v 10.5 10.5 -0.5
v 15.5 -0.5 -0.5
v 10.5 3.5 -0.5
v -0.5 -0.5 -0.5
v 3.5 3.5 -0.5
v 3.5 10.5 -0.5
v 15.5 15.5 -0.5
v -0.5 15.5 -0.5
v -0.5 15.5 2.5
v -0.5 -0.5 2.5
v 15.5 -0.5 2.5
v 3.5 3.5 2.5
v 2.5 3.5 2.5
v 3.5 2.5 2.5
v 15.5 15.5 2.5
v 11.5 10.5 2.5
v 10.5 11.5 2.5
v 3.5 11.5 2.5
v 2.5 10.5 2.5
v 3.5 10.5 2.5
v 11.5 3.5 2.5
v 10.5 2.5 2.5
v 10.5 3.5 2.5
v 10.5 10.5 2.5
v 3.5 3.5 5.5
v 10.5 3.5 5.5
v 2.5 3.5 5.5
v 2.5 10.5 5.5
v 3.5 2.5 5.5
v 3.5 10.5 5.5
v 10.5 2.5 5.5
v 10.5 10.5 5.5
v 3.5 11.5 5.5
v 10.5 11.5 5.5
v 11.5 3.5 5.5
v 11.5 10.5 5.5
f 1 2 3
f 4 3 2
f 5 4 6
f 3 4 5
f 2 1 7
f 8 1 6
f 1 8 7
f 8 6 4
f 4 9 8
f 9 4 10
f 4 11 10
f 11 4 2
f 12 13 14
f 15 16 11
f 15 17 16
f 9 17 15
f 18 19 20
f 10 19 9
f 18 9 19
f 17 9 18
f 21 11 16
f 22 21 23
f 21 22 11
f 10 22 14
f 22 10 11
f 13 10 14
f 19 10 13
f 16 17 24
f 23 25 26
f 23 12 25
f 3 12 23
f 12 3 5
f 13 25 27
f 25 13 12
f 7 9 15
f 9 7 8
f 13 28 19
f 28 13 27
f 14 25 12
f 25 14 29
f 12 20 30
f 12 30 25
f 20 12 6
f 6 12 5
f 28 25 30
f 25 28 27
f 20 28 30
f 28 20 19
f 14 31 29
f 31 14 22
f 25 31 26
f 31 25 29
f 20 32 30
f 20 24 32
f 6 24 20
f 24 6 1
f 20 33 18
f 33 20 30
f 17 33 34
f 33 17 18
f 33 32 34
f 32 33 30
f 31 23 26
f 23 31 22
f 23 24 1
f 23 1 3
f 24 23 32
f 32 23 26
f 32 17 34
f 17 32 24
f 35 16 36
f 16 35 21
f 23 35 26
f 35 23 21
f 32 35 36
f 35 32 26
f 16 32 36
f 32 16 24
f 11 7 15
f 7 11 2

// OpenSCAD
union() {
    translate([0, 0, 0]) color("brown") cube([1, 1, 1],center=true);
    translate([0, 0, 1]) color("brown") cube([1, 1, 1],center=true);
    translate([0, 0, 2]) color("brown") cube([1, 1, 1],center=true);
    translate([0, 1, 0]) color("brown") cube([1, 1, 1],center=true);
    translate([0, 1, 1]) color("brown") cube([1, 1, 1],center=true);
    translate([0, 1, 2]) color("brown") cube([1, 1, 1],center=true);
    translate([0, 2, 0]) color("brown") cube([1, 1, 1],center=true);
    translate([0, 2, 1]) color("brown") cube([1, 1, 1],center=true);
    translate([0, 2, 2]) color("brown") cube([1, 1, 1],center=true);
    translate([0, 3, 0]) color("brown") cube([1, 1, 1],center=true);
    translate([0, 3, 1]) color("brown") cube([1, 1, 1],center=true);
    translate([0, 3, 2]) color("brown") cube([1, 1, 1],center=true);
    translate([0, 4, 0]) color("brown") cube([1, 1, 1],center=true);
    translate([0, 4, 1]) color("brown") cube([1, 1, 1],center=true);
    translate([0, 4, 2]) color("brown") cube([1, 1, 1],center=true);
    translate([0, 5, 0]) color("brown") cube([1, 1, 1],center=true);
    translate([0, 5, 1]) color("brown") cube([1, 1, 1],center=true);
    translate([0, 5, 2]) color("brown") cube([1, 1, 1],center=true);
    translate([0, 6, 0]) color("brown") cube([1, 1, 1],center=true);
    translate([0, 6, 1]) color("brown") cube([1, 1, 1],center=true);
    translate([0, 6, 2]) color("brown") cube([1, 1, 1],center=true);
    translate([0, 7, 0]) color("brown") cube([1, 1, 1],center=true);
    translate([0, 7, 1]) color("brown") cube([1, 1, 1],center=true);
    translate([0, 7, 2]) color("brown") cube([1, 1, 1],center=true);
    translate([0, 8, 0]) color("brown") cube([1, 1, 1],center=true);
    translate([0, 8, 1]) color("brown") cube([1, 1, 1],center=true);
    translate([0, 8, 2]) color("brown") cube([1, 1, 1],center=true);
    translate([0, 9, 0]) color("brown") cube([1, 1, 1],center=true);
    translate([0, 9, 1]) color("brown") cube([1, 1, 1],center=true);
    translate([0, 9, 2]) color("brown") cube([1, 1, 1],center=true);
    translate([0, 10, 0]) color("brown") cube([1, 1, 1],center=true);
    translate([0, 10, 1]) color("brown") cube([1, 1, 1],center=true);
    translate([0, 10, 2]) color("brown") cube([1, 1, 1],center=true);
    translate([0, 11, 0]) color("brown") cube([1, 1, 1],center=true);
    translate([0, 11, 1]) color("brown") cube([1, 1, 1],center=true);
    translate([0, 11, 2]) color("brown") cube([1, 1, 1],center=true);
    translate([0, 12, 0]) color("brown") cube([1, 1, 1],center=true);
    translate([0, 12, 1]) color("brown") cube([1, 1, 1],center=true);
    translate([0, 12, 2]) color("brown") cube([1, 1, 1],center=true);
    translate([0, 13, 0]) color("brown") cube([1, 1, 1],center=true);
    translate([0, 13, 1]) color("brown") cube([1, 1, 1],center=true);
    translate([0, 13, 2]) color("brown") cube([1, 1, 1],center=true);
    translate([0, 14, 0]) color("brown") cube([1, 1, 1],center=true);
    translate([0, 14, 1]) color("brown") cube([1, 1, 1],center=true);
    translate([0, 14, 2]) color("brown") cube([1, 1, 1],center=true);
    translate([0, 15, 0]) color("brown") cube([1, 1, 1],center=true);
    translate([0, 15, 1]) color("brown") cube([1, 1, 1],center=true);
    translate([0, 15, 2]) color("brown") cube([1, 1, 1],center=true);
    translate([1, 0, 0]) color("brown") cube([1, 1, 1],center=true);
    translate([1, 0, 1]) color("brown") cube([1, 1, 1],center=true);
    translate([1, 0, 2]) color("brown") cube([1, 1, 1],center=true);
    translate([1, 1, 0]) color("brown") cube([1, 1, 1],center=true);
    translate([1, 1, 1]) color("brown") cube([1, 1, 1],center=true);
    translate([1, 1, 2]) color("brown") cube([1, 1, 1],center=true);
    translate([1, 2, 0]) color("brown") cube([1, 1, 1],center=true);
    translate([1, 2, 1]) color("brown") cube([1, 1, 1],center=true);
    translate([1, 2, 2]) color("brown") cube([1, 1, 1],center=true);
    translate([1, 3, 0]) color("brown") cube([1, 1, 1],center=true);
    translate([1, 3, 1]) color("brown") cube([1, 1, 1],center=true);
    translate([1, 3, 2]) color("brown") cube([1, 1, 1],center=true);
    translate([1, 4, 0]) color("brown") cube([1, 1, 1],center=true);
    translate([1, 4, 1]) color("brown") cube([1, 1, 1],center=true);
    translate([1, 4, 2]) color("brown") cube([1, 1, 1],center=true);
    translate([1, 5, 0]) color("brown") cube([1, 1, 1],center=true);
    translate([1, 5, 1]) color("brown") cube([1, 1, 1],center=true);
    translate([1, 5, 2]) color("brown") cube([1, 1, 1],center=true);
    translate([1, 6, 0]) color("brown") cube([1, 1, 1],center=true);
    translate([1, 6, 1]) color("brown") cube([1, 1, 1],center=true);
    translate([1, 6, 2]) color("brown") cube([1, 1, 1],center=true);
    translate([1, 7, 0]) color("brown") cube([1, 1, 1],center=true);
    translate([1, 7, 1]) color("brown") cube([1, 1, 1],center=true);
    translate([1, 7, 2]) color("brown") cube([1, 1, 1],center=true);
    translate([1, 8, 0]) color("brown") cube([1, 1, 1],center=true);
    translate([1, 8, 1]) color("brown") cube([1, 1, 1],center=true);
    translate([1, 8, 2]) color("brown") cube([1, 1, 1],center=true);
    translate([1, 9, 0]) color("brown") cube([1, 1, 1],center=true);
    translate([1, 9, 1]) color("brown") cube([1, 1, 1],center=true);
    translate([1, 9, 2]) color("brown") cube([1, 1, 1],center=true);
    translate([1, 10, 0]) color("brown") cube([1, 1, 1],center=true);
    translate([1, 10, 1]) color("brown") cube([1, 1, 1],center=true);
    translate([1, 10, 2]) color("brown") cube([1, 1, 1],center=true);
    translate([1, 11, 0]) color("brown") cube([1, 1, 1],center=true);
    translate([1, 11, 1]) color("brown") cube([1, 1, 1],center=true);
    translate([1, 11, 2]) color("brown") cube([1, 1, 1],center=true);
    translate([1, 12, 0]) color("brown") cube([1, 1, 1],center=true);
    translate([1, 12, 1]) color("brown") cube([1, 1, 1],center=true);
    translate([1, 12, 2]) color("brown") cube([1, 1, 1],center=true);
    translate([1, 13, 0]) color("brown") cube([1, 1, 1],center=true);
    translate([1, 13, 1]) color("brown") cube([1, 1, 1],center=true);
    translate([1, 13, 2]) color("brown") cube([1, 1, 1],center=true);
    translate([1, 14, 0]) color("brown") cube([1, 1, 1],center=true);
    translate([1, 14, 1]) color("brown") cube([1, 1, 1],center=true);
    translate([1, 14, 2]) color("brown") cube([1, 1, 1],center=true);
    translate([1, 15, 0]) color("brown") cube([1, 1, 1],center=true);
    translate([1, 15, 1]) color("brown") cube([1, 1, 1],center=true);
    translate([1, 15, 2]) color("brown") cube([1, 1, 1],center=true);
    translate([2, 0, 0]) color("brown") cube([1, 1, 1],center=true);
    translate([2, 0, 1]) color("brown") cube([1, 1, 1],center=true);
    translate([2, 0, 2]) color("brown") cube([1, 1, 1],center=true);
    translate([2, 1, 0]) color("brown") cube([1, 1, 1],center=true);
    translate([2, 1, 1]) color("brown") cube([1, 1, 1],center=true);
    translate([2, 1, 2]) color("brown") cube([1, 1, 1],center=true);
    translate([2, 2, 0]) color("brown") cube([1, 1, 1],center=true);
    translate([2, 2, 1]) color("brown") cube([1, 1, 1],center=true);
    translate([2, 2, 2]) color("brown") cube([1, 1, 1],center=true);
    translate([2, 3, 0]) color("brown") cube([1, 1, 1],center=true);
    translate([2, 3, 1]) color("brown") cube([1, 1, 1],center=true);
    translate([2, 3, 2]) color("brown") cube([1, 1, 1],center=true);
    translate([2, 4, 0]) color("brown") cube([1, 1, 1],center=true);
    translate([2, 4, 1]) color("brown") cube([1, 1, 1],center=true);
    translate([2, 4, 2]) color("brown") cube([1, 1, 1],center=true);
    translate([2, 5, 0]) color("brown") cube([1, 1, 1],center=true);
    translate([2, 5, 1]) color("brown") cube([1, 1, 1],center=true);
    translate([2, 5, 2]) color("brown") cube([1, 1, 1],center=true);
    translate([2, 6, 0]) color("brown") cube([1, 1, 1],center=true);
    translate([2, 6, 1]) color("brown") cube([1, 1, 1],center=true);
    translate([2, 6, 2]) color("brown") cube([1, 1, 1],center=true);
    translate([2, 7, 0]) color("brown") cube([1, 1, 1],center=true);
    translate([2, 7, 1]) color("brown") cube([1, 1, 1],center=true);
    translate([2, 7, 2]) color("brown") cube([1, 1, 1],center=true);
    translate([2, 8, 0]) color("brown") cube([1, 1, 1],center=true);
    translate([2, 8, 1]) color("brown") cube([1, 1, 1],center=true);
    translate([2, 8, 2]) color("brown") cube([1, 1, 1],center=true);
    translate([2, 9, 0]) color("brown") cube([1, 1, 1],center=true);
    translate([2, 9, 1]) color("brown") cube([1, 1, 1],center=true);
    translate([2, 9, 2]) color("brown") cube([1, 1, 1],center=true);
    translate([2, 10, 0]) color("brown") cube([1, 1, 1],center=true);
    translate([2, 10, 1]) color("brown") cube([1, 1, 1],center=true);
    translate([2, 10, 2]) color("brown") cube([1, 1, 1],center=true);
    translate([2, 11, 0]) color("brown") cube([1, 1, 1],center=true);
    translate([2, 11, 1]) color("brown") cube([1, 1, 1],center=true);
    translate([2, 11, 2]) color("brown") cube([1, 1, 1],center=true);
    translate([2, 12, 0]) color("brown") cube([1, 1, 1],center=true);
    translate([2, 12, 1]) color("brown") cube([1, 1, 1],center=true);
    translate([2, 12, 2]) color("brown") cube([1, 1, 1],center=true);
    translate([2, 13, 0]) color("brown") cube([1, 1, 1],center=true);
    translate([2, 13, 1]) color("brown") cube([1, 1, 1],center=true);
    translate([2, 13, 2]) color("brown") cube([1, 1, 1],center=true);
    translate([2, 14, 0]) color("brown") cube([1, 1, 1],center=true);
    translate([2, 14, 1]) color("brown") cube([1, 1, 1],center=true);
    translate([2, 14, 2]) color("brown") cube([1, 1, 1],center=true);
    translate([2, 15, 0]) color("brown") cube([1, 1, 1],center=true);
    translate([2, 15, 1]) color("brown") cube([1, 1, 1],center=true);
    translate([2, 15, 2]) color("brown") cube([1, 1, 1],center=true);
    translate([3, 0, 0]) color("brown") cube([1, 1, 1],center=true);
    translate([3, 0, 1]) color("brown") cube([1, 1, 1],center=true);
    translate([3, 0, 2]) color("brown") cube([1, 1, 1],center=true);
    translate([3, 1, 0]) color("brown") cube([1, 1, 1],center=true);
    translate([3, 1, 1]) color("brown") cube([1, 1, 1],center=true);
    translate([3, 1, 2]) color("brown") cube([1, 1, 1],center=true);
    translate([3, 2, 0]) color("brown") cube([1, 1, 1],center=true);
    translate([3, 2, 1]) color("brown") cube([1, 1, 1],center=true);
    translate([3, 2, 2]) color("brown") cube([1, 1, 1],center=true);
    translate([3, 3, 0]) color("brown") cube([1, 1, 1],center=true);
    translate([3, 3, 1]) color("brown") cube([1, 1, 1],center=true);
    translate([3, 3, 2]) color("brown") cube([1, 1, 1],center=true);
    translate([3, 4, 0]) color("brown") cube([1, 1, 1],center=true);
    translate([3, 4, 1]) color("brown") cube([1, 1, 1],center=true);
    translate([3, 4, 2]) color("brown") cube([1, 1, 1],center=true);
    translate([3, 4, 3]) color("brown") cube([1, 1, 1],center=true);
    translate([3, 4, 4]) color("brown") cube([1, 1, 1],center=true);
    translate([3, 4, 5]) color("brown") cube([1, 1, 1],center=true);
    translate([3, 5, 0]) color("brown") cube([1, 1, 1],center=true);
    translate([3, 5, 1]) color("brown") cube([1, 1, 1],center=true);
    translate([3, 5, 2]) color("brown") cube([1, 1, 1],center=true);
    translate([3, 5, 3]) color("brown") cube([1, 1, 1],center=true);
    translate([3, 5, 4]) color("brown") cube([1, 1, 1],center=true);
    translate([3, 5, 5]) color("brown") cube([1, 1, 1],center=true);
    translate([3, 6, 0]) color("brown") cube([1, 1, 1],center=true);
    translate([3, 6, 1]) color("brown") cube([1, 1, 1],center=true);
    translate([3, 6, 2]) color("brown") cube([1, 1, 1],center=true);
    translate([3, 6, 3]) color("brown") cube([1, 1, 1],center=true);
    translate([3, 6, 4]) color("brown") cube([1, 1, 1],center=true);
    translate([3, 6, 5]) color("brown") cube([1, 1, 1],center=true);
    translate([3, 7, 0]) color("brown") cube([1, 1, 1],center=true);
    translate([3, 7, 1]) color("brown") cube([1, 1, 1],center=true);
    translate([3, 7, 2]) color("brown") cube([1, 1, 1],center=true);
    translate([3, 7, 3]) color("brown") cube([1, 1, 1],center=true);
    translate([3, 7, 4]) color("brown") cube([1, 1, 1],center=true);
    translate([3, 7, 5]) color("brown") cube([1, 1, 1],center=true);
    translate([3, 8, 0]) color("brown") cube([1, 1, 1],center=true);
    translate([3, 8, 1]) color("brown") cube([1, 1, 1],center=true);
    translate([3, 8, 2]) color("brown") cube([1, 1, 1],center=true);
    translate([3, 8, 3]) color("brown") cube([1, 1, 1],center=true);
    translate([3, 8, 4]) color("brown") cube([1, 1, 1],center=true);
    translate([3, 8, 5]) color("brown") cube([1, 1, 1],center=true);
    translate([3, 9, 0]) color("brown") cube([1, 1, 1],center=true);
    translate([3, 9, 1]) color("brown") cube([1, 1, 1],center=true);
    translate([3, 9, 2]) color("brown") cube([1, 1, 1],center=true);
    translate([3, 9, 3]) color("brown") cube([1, 1, 1],center=true);
    translate([3, 9, 4]) color("brown") cube([1, 1, 1],center=true);
    translate([3, 9, 5]) color("brown") cube([1, 1, 1],center=true);
    translate([3, 10, 0]) color("brown") cube([1, 1, 1],center=true);
    translate([3, 10, 1]) color("brown") cube([1, 1, 1],center=true);
    translate([3, 10, 2]) color("brown") cube([1, 1, 1],center=true);
    translate([3, 10, 3]) color("brown") cube([1, 1, 1],center=true);
    translate([3, 10, 4]) color("brown") cube([1, 1, 1],center=true);
    translate([3, 10, 5]) color("brown") cube([1, 1, 1],center=true);
    translate([3, 11, 0]) color("brown") cube([1, 1, 1],center=true);
    translate([3, 11, 1]) color("brown") cube([1, 1, 1],center=true);
    translate([3, 11, 2]) color("brown") cube([1, 1, 1],center=true);
    translate([3, 12, 0]) color("brown") cube([1, 1, 1],center=true);
    translate([3, 12, 1]) color("brown") cube([1, 1, 1],center=true);
    translate([3, 12, 2]) color("brown") cube([1, 1, 1],center=true);
    translate([3, 13, 0]) color("brown") cube([1, 1, 1],center=true);
    translate([3, 13, 1]) color("brown") cube([1, 1, 1],center=true);
    translate([3, 13, 2]) color("brown") cube([1, 1, 1],center=true);
    translate([3, 14, 0]) color("brown") cube([1, 1, 1],center=true);
    translate([3, 14, 1]) color("brown") cube([1, 1, 1],center=true);
    translate([3, 14, 2]) color("brown") cube([1, 1, 1],center=true);
    translate([3, 15, 0]) color("brown") cube([1, 1, 1],center=true);
    translate([3, 15, 1]) color("brown") cube([1, 1, 1],center=true);
    translate([3, 15, 2]) color("brown") cube([1, 1, 1],center=true);
    translate([4, 0, 0]) color("brown") cube([1, 1, 1],center=true);
    translate([4, 0, 1]) color("brown") cube([1, 1, 1],center=true);
    translate([4, 0, 2]) color("brown") cube([1, 1, 1],center=true);
    translate([4, 1, 0]) color("brown") cube([1, 1, 1],center=true);
    translate([4, 1, 1]) color("brown") cube([1, 1, 1],center=true);
    translate([4, 1, 2]) color("brown") cube([1, 1, 1],center=true);
    translate([4, 2, 0]) color("brown") cube([1, 1, 1],center=true);
    translate([4, 2, 1]) color("brown") cube([1, 1, 1],center=true);
    translate([4, 2, 2]) color("brown") cube([1, 1, 1],center=true);
    translate([4, 3, 0]) color("brown") cube([1, 1, 1],center=true);
    translate([4, 3, 1]) color("brown") cube([1, 1, 1],center=true);
    translate([4, 3, 2]) color("brown") cube([1, 1, 1],center=true);
    translate([4, 3, 3]) color("brown") cube([1, 1, 1],center=true);
    translate([4, 3, 4]) color("brown") cube([1, 1, 1],center=true);
    translate([4, 3, 5]) color("brown") cube([1, 1, 1],center=true);
    translate([4, 11, 0]) color("brown") cube([1, 1, 1],center=true);
    translate([4, 11, 1]) color("brown") cube([1, 1, 1],center=true);
    translate([4, 11, 2]) color("brown") cube([1, 1, 1],center=true);
    translate([4, 11, 3]) color("brown") cube([1, 1, 1],center=true);
    translate([4, 11, 4]) color("brown") cube([1, 1, 1],center=true);
    translate([4, 11, 5]) color("brown") cube([1, 1, 1],center=true);
    translate([4, 12, 0]) color("brown") cube([1, 1, 1],center=true);
    translate([4, 12, 1]) color("brown") cube([1, 1, 1],center=true);
    translate([4, 12, 2]) color("brown") cube([1, 1, 1],center=true);
    translate([4, 13, 0]) color("brown") cube([1, 1, 1],center=true);
    translate([4, 13, 1]) color("brown") cube([1, 1, 1],center=true);
    translate([4, 13, 2]) color("brown") cube([1, 1, 1],center=true);
    translate([4, 14, 0]) color("brown") cube([1, 1, 1],center=true);
    translate([4, 14, 1]) color("brown") cube([1, 1, 1],center=true);
    translate([4, 14, 2]) color("brown") cube([1, 1, 1],center=true);
    translate([4, 15, 0]) color("brown") cube([1, 1, 1],center=true);
    translate([4, 15, 1]) color("brown") cube([1, 1, 1],center=true);
    translate([4, 15, 2]) color("brown") cube([1, 1, 1],center=true);
    translate([5, 0, 0]) color("brown") cube([1, 1, 1],center=true);
    translate([5, 0, 1]) color("brown") cube([1, 1, 1],center=true);
    translate([5, 0, 2]) color("brown") cube([1, 1, 1],center=true);
    translate([5, 1, 0]) color("brown") cube([1, 1, 1],center=true);
    translate([5, 1, 1]) color("brown") cube([1, 1, 1],center=true);
    translate([5, 1, 2]) color("brown") cube([1, 1, 1],center=true);
    translate([5, 2, 0]) color("brown") cube([1, 1, 1],center=true);
    translate([5, 2, 1]) color("brown") cube([1, 1, 1],center=true);
    translate([5, 2, 2]) color("brown") cube([1, 1, 1],center=true);
    translate([5, 3, 0]) color("brown") cube([1, 1, 1],center=true);
    translate([5, 3, 1]) color("brown") cube([1, 1, 1],center=true);
    translate([5, 3, 2]) color("brown") cube([1, 1, 1],center=true);
    translate([5, 3, 3]) color("brown") cube([1, 1, 1],center=true);
    translate([5, 3, 4]) color("brown") cube([1, 1, 1],center=true);
    translate([5, 3, 5]) color("brown") cube([1, 1, 1],center=true);
    translate([5, 11, 0]) color("brown") cube([1, 1, 1],center=true);
    translate([5, 11, 1]) color("brown") cube([1, 1, 1],center=true);
    translate([5, 11, 2]) color("brown") cube([1, 1, 1],center=true);
    translate([5, 11, 3]) color("brown") cube([1, 1, 1],center=true);
    translate([5, 11, 4]) color("brown") cube([1, 1, 1],center=true);
    translate([5, 11, 5]) color("brown") cube([1, 1, 1],center=true);
    translate([5, 12, 0]) color("brown") cube([1, 1, 1],center=true);
    translate([5, 12, 1]) color("brown") cube([1, 1, 1],center=true);
    translate([5, 12, 2]) color("brown") cube([1, 1, 1],center=true);
    translate([5, 13, 0]) color("brown") cube([1, 1, 1],center=true);
    translate([5, 13, 1]) color("brown") cube([1, 1, 1],center=true);
    translate([5, 13, 2]) color("brown") cube([1, 1, 1],center=true);
    translate([5, 14, 0]) color("brown") cube([1, 1, 1],center=true);
    translate([5, 14, 1]) color("brown") cube([1, 1, 1],center=true);
    translate([5, 14, 2]) color("brown") cube([1, 1, 1],center=true);
    translate([5, 15, 0]) color("brown") cube([1, 1, 1],center=true);
    translate([5, 15, 1]) color("brown") cube([1, 1, 1],center=true);
    translate([5, 15, 2]) color("brown") cube([1, 1, 1],center=true);
    translate([6, 0, 0]) color("brown") cube([1, 1, 1],center=true);
    translate([6, 0, 1]) color("brown") cube([1, 1, 1],center=true);
    translate([6, 0, 2]) color("brown") cube([1, 1, 1],center=true);
    translate([6, 1, 0]) color("brown") cube([1, 1, 1],center=true);
    translate([6, 1, 1]) color("brown") cube([1, 1, 1],center=true);
    translate([6, 1, 2]) color("brown") cube([1, 1, 1],center=true);
    translate([6, 2, 0]) color("brown") cube([1, 1, 1],center=true);
    translate([6, 2, 1]) color("brown") cube([1, 1, 1],center=true);
    translate([6, 2, 2]) color("brown") cube([1, 1, 1],center=true);
    translate([6, 3, 0]) color("brown") cube([1, 1, 1],center=true);
    translate([6, 3, 1]) color("brown") cube([1, 1, 1],center=true);
    translate([6, 3, 2]) color("brown") cube([1, 1, 1],center=true);
    translate([6, 3, 3]) color("brown") cube([1, 1, 1],center=true);
    translate([6, 3, 4]) color("brown") cube([1, 1, 1],center=true);
    translate([6, 3, 5]) color("brown") cube([1, 1, 1],center=true);
    translate([6, 11, 0]) color("brown") cube([1, 1, 1],center=true);
    translate([6, 11, 1]) color("brown") cube([1, 1, 1],center=true);
    translate([6, 11, 2]) color("brown") cube([1, 1, 1],center=true);
    translate([6, 11, 3]) color("brown") cube([1, 1, 1],center=true);
    translate([6, 11, 4]) color("brown") cube([1, 1, 1],center=true);
    translate([6, 11, 5]) color("brown") cube([1, 1, 1],center=true);
    translate([6, 12, 0]) color("brown") cube([1, 1, 1],center=true);
    translate([6, 12, 1]) color("brown") cube([1, 1, 1],center=true);
    translate([6, 12, 2]) color("brown") cube([1, 1, 1],center=true);
    translate([6, 13, 0]) color("brown") cube([1, 1, 1],center=true);
    translate([6, 13, 1]) color("brown") cube([1, 1, 1],center=true);
    translate([6, 13, 2]) color("brown") cube([1, 1, 1],center=true);
    translate([6, 14, 0]) color("brown") cube([1, 1, 1],center=true);
    translate([6, 14, 1]) color("brown") cube([1, 1, 1],center=true);
    translate([6, 14, 2]) color("brown") cube([1, 1, 1],center=true);
    translate([6, 15, 0]) color("brown") cube([1, 1, 1],center=true);
    translate([6, 15, 1]) color("brown") cube([1, 1, 1],center=true);
    translate([6, 15, 2]) color("brown") cube([1, 1, 1],center=true);
    translate([7, 0, 0]) color("brown") cube([1, 1, 1],center=true);
    translate([7, 0, 1]) color("brown") cube([1, 1, 1],center=true);
    translate([7, 0, 2]) color("brown") cube([1, 1, 1],center=true);
    translate([7, 1, 0]) color("brown") cube([1, 1, 1],center=true);
    translate([7, 1, 1]) color("brown") cube([1, 1, 1],center=true);
    translate([7, 1, 2]) color("brown") cube([1, 1, 1],center=true);
    translate([7, 2, 0]) color("brown") cube([1, 1, 1],center=true);
    translate([7, 2, 1]) color("brown") cube([1, 1, 1],center=true);
    translate([7, 2, 2]) color("brown") cube([1, 1, 1],center=true);
    translate([7, 3, 0]) color("brown") cube([1, 1, 1],center=true);
    translate([7, 3, 1]) color("brown") cube([1, 1, 1],center=true);
    translate([7, 3, 2]) color("brown") cube([1, 1, 1],center=true);
    translate([7, 3, 3]) color("brown") cube([1, 1, 1],center=true);
    translate([7, 3, 4]) color("brown") cube([1, 1, 1],center=true);
    translate([7, 3, 5]) color("brown") cube([1, 1, 1],center=true);
    translate([7, 11, 0]) color("brown") cube([1, 1, 1],center=true);
    translate([7, 11, 1]) color("brown") cube([1, 1, 1],center=true);
    translate([7, 11, 2]) color("brown") cube([1, 1, 1],center=true);
    translate([7, 11, 3]) color("brown") cube([1, 1, 1],center=true);
    translate([7, 11, 4]) color("brown") cube([1, 1, 1],center=true);
    translate([7, 11, 5]) color("brown") cube([1, 1, 1],center=true);
    translate([7, 12, 0]) color("brown") cube([1, 1, 1],center=true);
    translate([7, 12, 1]) color("brown") cube([1, 1, 1],center=true);
    translate([7, 12, 2]) color("brown") cube([1, 1, 1],center=true);
    translate([7, 13, 0]) color("brown") cube([1, 1, 1],center=true);
    translate([7, 13, 1]) color("brown") cube([1, 1, 1],center=true);
    translate([7, 13, 2]) color("brown") cube([1, 1, 1],center=true);
    translate([7, 14, 0]) color("brown") cube([1, 1, 1],center=true);
    translate([7, 14, 1]) color("brown") cube([1, 1, 1],center=true);
    translate([7, 14, 2]) color("brown") cube([1, 1, 1],center=true);
    translate([7, 15, 0]) color("brown") cube([1, 1, 1],center=true);
    translate([7, 15, 1]) color("brown") cube([1, 1, 1],center=true);
    translate([7, 15, 2]) color("brown") cube([1, 1, 1],center=true);
    translate([8, 0, 0]) color("brown") cube([1, 1, 1],center=true);
    translate([8, 0, 1]) color("brown") cube([1, 1, 1],center=true);
    translate([8, 0, 2]) color("brown") cube([1, 1, 1],center=true);
    translate([8, 1, 0]) color("brown") cube([1, 1, 1],center=true);
    translate([8, 1, 1]) color("brown") cube([1, 1, 1],center=true);
    translate([8, 1, 2]) color("brown") cube([1, 1, 1],center=true);
    translate([8, 2, 0]) color("brown") cube([1, 1, 1],center=true);
    translate([8, 2, 1]) color("brown") cube([1, 1, 1],center=true);
    translate([8, 2, 2]) color("brown") cube([1, 1, 1],center=true);
    translate([8, 3, 0]) color("brown") cube([1, 1, 1],center=true);
    translate([8, 3, 1]) color("brown") cube([1, 1, 1],center=true);
    translate([8, 3, 2]) color("brown") cube([1, 1, 1],center=true);
    translate([8, 3, 3]) color("brown") cube([1, 1, 1],center=true);
    translate([8, 3, 4]) color("brown") cube([1, 1, 1],center=true);
    translate([8, 3, 5]) color("brown") cube([1, 1, 1],center=true);
    translate([8, 11, 0]) color("brown") cube([1, 1, 1],center=true);
    translate([8, 11, 1]) color("brown") cube([1, 1, 1],center=true);
    translate([8, 11, 2]) color("brown") cube([1, 1, 1],center=true);
    translate([8, 11, 3]) color("brown") cube([1, 1, 1],center=true);
    translate([8, 11, 4]) color("brown") cube([1, 1, 1],center=true);
    translate([8, 11, 5]) color("brown") cube([1, 1, 1],center=true);
    translate([8, 12, 0]) color("brown") cube([1, 1, 1],center=true);
    translate([8, 12, 1]) color("brown") cube([1, 1, 1],center=true);
    translate([8, 12, 2]) color("brown") cube([1, 1, 1],center=true);
    translate([8, 13, 0]) color("brown") cube([1, 1, 1],center=true);
    translate([8, 13, 1]) color("brown") cube([1, 1, 1],center=true);
    translate([8, 13, 2]) color("brown") cube([1, 1, 1],center=true);
    translate([8, 14, 0]) color("brown") cube([1, 1, 1],center=true);
    translate([8, 14, 1]) color("brown") cube([1, 1, 1],center=true);
    translate([8, 14, 2]) color("brown") cube([1, 1, 1],center=true);
    translate([8, 15, 0]) color("brown") cube([1, 1, 1],center=true);
    translate([8, 15, 1]) color("brown") cube([1, 1, 1],center=true);
    translate([8, 15, 2]) color("brown") cube([1, 1, 1],center=true);
    translate([9, 0, 0]) color("brown") cube([1, 1, 1],center=true);
    translate([9, 0, 1]) color("brown") cube([1, 1, 1],center=true);
    translate([9, 0, 2]) color("brown") cube([1, 1, 1],center=true);
    translate([9, 1, 0]) color("brown") cube([1, 1, 1],center=true);
    translate([9, 1, 1]) color("brown") cube([1, 1, 1],center=true);
    translate([9, 1, 2]) color("brown") cube([1, 1, 1],center=true);
    translate([9, 2, 0]) color("brown") cube([1, 1, 1],center=true);
    translate([9, 2, 1]) color("brown") cube([1, 1, 1],center=true);
    translate([9, 2, 2]) color("brown") cube([1, 1, 1],center=true);
    translate([9, 3, 0]) color("brown") cube([1, 1, 1],center=true);
    translate([9, 3, 1]) color("brown") cube([1, 1, 1],center=true);
    translate([9, 3, 2]) color("brown") cube([1, 1, 1],center=true);
    translate([9, 3, 3]) color("brown") cube([1, 1, 1],center=true);
    translate([9, 3, 4]) color("brown") cube([1, 1, 1],center=true);
    translate([9, 3, 5]) color("brown") cube([1, 1, 1],center=true);
    translate([9, 11, 0]) color("brown") cube([1, 1, 1],center=true);
    translate([9, 11, 1]) color("brown") cube([1, 1, 1],center=true);
    translate([9, 11, 2]) color("brown") cube([1, 1, 1],center=true);
    translate([9, 11, 3]) color("brown") cube([1, 1, 1],center=true);
    translate([9, 11, 4]) color("brown") cube([1, 1, 1],center=true);
    translate([9, 11, 5]) color("brown") cube([1, 1, 1],center=true);
    translate([9, 12, 0]) color("brown") cube([1, 1, 1],center=true);
    translate([9, 12, 1]) color("brown") cube([1, 1, 1],center=true);
    translate([9, 12, 2]) color("brown") cube([1, 1, 1],center=true);
    translate([9, 13, 0]) color("brown") cube([1, 1, 1],center=true);
    translate([9, 13, 1]) color("brown") cube([1, 1, 1],center=true);
    translate([9, 13, 2]) color("brown") cube([1, 1, 1],center=true);
    translate([9, 14, 0]) color("brown") cube([1, 1, 1],center=true);
    translate([9, 14, 1]) color("brown") cube([1, 1, 1],center=true);
    translate([9, 14, 2]) color("brown") cube([1, 1, 1],center=true);
    translate([9, 15, 0]) color("brown") cube([1, 1, 1],center=true);
    translate([9, 15, 1]) color("brown") cube([1, 1, 1],center=true);
    translate([9, 15, 2]) color("brown") cube([1, 1, 1],center=true);
    translate([10, 0, 0]) color("brown") cube([1, 1, 1],center=true);
    translate([10, 0, 1]) color("brown") cube([1, 1, 1],center=true);
    translate([10, 0, 2]) color("brown") cube([1, 1, 1],center=true);
    translate([10, 1, 0]) color("brown") cube([1, 1, 1],center=true);
    translate([10, 1, 1]) color("brown") cube([1, 1, 1],center=true);
    translate([10, 1, 2]) color("brown") cube([1, 1, 1],center=true);
    translate([10, 2, 0]) color("brown") cube([1, 1, 1],center=true);
    translate([10, 2, 1]) color("brown") cube([1, 1, 1],center=true);
    translate([10, 2, 2]) color("brown") cube([1, 1, 1],center=true);
    translate([10, 3, 0]) color("brown") cube([1, 1, 1],center=true);
    translate([10, 3, 1]) color("brown") cube([1, 1, 1],center=true);
    translate([10, 3, 2]) color("brown") cube([1, 1, 1],center=true);
    translate([10, 3, 3]) color("brown") cube([1, 1, 1],center=true);
    translate([10, 3, 4]) color("brown") cube([1, 1, 1],center=true);
    translate([10, 3, 5]) color("brown") cube([1, 1, 1],center=true);
    translate([10, 11, 0]) color("brown") cube([1, 1, 1],center=true);
    translate([10, 11, 1]) color("brown") cube([1, 1, 1],center=true);
    translate([10, 11, 2]) color("brown") cube([1, 1, 1],center=true);
    translate([10, 11, 3]) color("brown") cube([1, 1, 1],center=true);
    translate([10, 11, 4]) color("brown") cube([1, 1, 1],center=true);
    translate([10, 11, 5]) color("brown") cube([1, 1, 1],center=true);
    translate([10, 12, 0]) color("brown") cube([1, 1, 1],center=true);
    translate([10, 12, 1]) color("brown") cube([1, 1, 1],center=true);
    translate([10, 12, 2]) color("brown") cube([1, 1, 1],center=true);
    translate([10, 13, 0]) color("brown") cube([1, 1, 1],center=true);
    translate([10, 13, 1]) color("brown") cube([1, 1, 1],center=true);
    translate([10, 13, 2]) color("brown") cube([1, 1, 1],center=true);
    translate([10, 14, 0]) color("brown") cube([1, 1, 1],center=true);
    translate([10, 14, 1]) color("brown") cube([1, 1, 1],center=true);
    translate([10, 14, 2]) color("brown") cube([1, 1, 1],center=true);
    translate([10, 15, 0]) color("brown") cube([1, 1, 1],center=true);
    translate([10, 15, 1]) color("brown") cube([1, 1, 1],center=true);
    translate([10, 15, 2]) color("brown") cube([1, 1, 1],center=true);
    translate([11, 0, 0]) color("brown") cube([1, 1, 1],center=true);
    translate([11, 0, 1]) color("brown") cube([1, 1, 1],center=true);
    translate([11, 0, 2]) color("brown") cube([1, 1, 1],center=true);
    translate([11, 1, 0]) color("brown") cube([1, 1, 1],center=true);
    translate([11, 1, 1]) color("brown") cube([1, 1, 1],center=true);
    translate([11, 1, 2]) color("brown") cube([1, 1, 1],center=true);
    translate([11, 2, 0]) color("brown") cube([1, 1, 1],center=true);
    translate([11, 2, 1]) color("brown") cube([1, 1, 1],center=true);
    translate([11, 2, 2]) color("brown") cube([1, 1, 1],center=true);
    translate([11, 3, 0]) color("brown") cube([1, 1, 1],center=true);
    translate([11, 3, 1]) color("brown") cube([1, 1, 1],center=true);
    translate([11, 3, 2]) color("brown") cube([1, 1, 1],center=true);
    translate([11, 4, 0]) color("brown") cube([1, 1, 1],center=true);
    translate([11, 4, 1]) color("brown") cube([1, 1, 1],center=true);
    translate([11, 4, 2]) color("brown") cube([1, 1, 1],center=true);
    translate([11, 4, 3]) color("brown") cube([1, 1, 1],center=true);
    translate([11, 4, 4]) color("brown") cube([1, 1, 1],center=true);
    translate([11, 4, 5]) color("brown") cube([1, 1, 1],center=true);
    translate([11, 5, 0]) color("brown") cube([1, 1, 1],center=true);
    translate([11, 5, 1]) color("brown") cube([1, 1, 1],center=true);
    translate([11, 5, 2]) color("brown") cube([1, 1, 1],center=true);
    translate([11, 5, 3]) color("brown") cube([1, 1, 1],center=true);
    translate([11, 5, 4]) color("brown") cube([1, 1, 1],center=true);
    translate([11, 5, 5]) color("brown") cube([1, 1, 1],center=true);
    translate([11, 6, 0]) color("brown") cube([1, 1, 1],center=true);
    translate([11, 6, 1]) color("brown") cube([1, 1, 1],center=true);
    translate([11, 6, 2]) color("brown") cube([1, 1, 1],center=true);
    translate([11, 6, 3]) color("brown") cube([1, 1, 1],center=true);
    translate([11, 6, 4]) color("brown") cube([1, 1, 1],center=true);
    translate([11, 6, 5]) color("brown") cube([1, 1, 1],center=true);
    translate([11, 7, 0]) color("brown") cube([1, 1, 1],center=true);
    translate([11, 7, 1]) color("brown") cube([1, 1, 1],center=true);
    translate([11, 7, 2]) color("brown") cube([1, 1, 1],center=true);
    translate([11, 7, 3]) color("brown") cube([1, 1, 1],center=true);
    translate([11, 7, 4]) color("brown") cube([1, 1, 1],center=true);
    translate([11, 7, 5]) color("brown") cube([1, 1, 1],center=true);
    translate([11, 8, 0]) color("brown") cube([1, 1, 1],center=true);
    translate([11, 8, 1]) color("brown") cube([1, 1, 1],center=true);
    translate([11, 8, 2]) color("brown") cube([1, 1, 1],center=true);
    translate([11, 8, 3]) color("brown") cube([1, 1, 1],center=true);
    translate([11, 8, 4]) color("brown") cube([1, 1, 1],center=true);
    translate([11, 8, 5]) color("brown") cube([1, 1, 1],center=true);
    translate([11, 9, 0]) color("brown") cube([1, 1, 1],center=true);
    translate([11, 9, 1]) color("brown") cube([1, 1, 1],center=true);
    translate([11, 9, 2]) color("brown") cube([1, 1, 1],center=true);
    translate([11, 9, 3]) color("brown") cube([1, 1, 1],center=true);
    translate([11, 9, 4]) color("brown") cube([1, 1, 1],center=true);
    translate([11, 9, 5]) color("brown") cube([1, 1, 1],center=true);
    translate([11, 10, 0]) color("brown") cube([1, 1, 1],center=true);
    translate([11, 10, 1]) color("brown") cube([1, 1, 1],center=true);
    translate([11, 10, 2]) color("brown") cube([1, 1, 1],center=true);
    translate([11, 10, 3]) color("brown") cube([1, 1, 1],center=true);
    translate([11, 10, 4]) color("brown") cube([1, 1, 1],center=true);
    translate([11, 10, 5]) color("brown") cube([1, 1, 1],center=true);
    translate([11, 11, 0]) color("brown") cube([1, 1, 1],center=true);
    translate([11, 11, 1]) color("brown") cube([1, 1, 1],center=true);
    translate([11, 11, 2]) color("brown") cube([1, 1, 1],center=true);
    translate([11, 12, 0]) color("brown") cube([1, 1, 1],center=true);
    translate([11, 12, 1]) color("brown") cube([1, 1, 1],center=true);
    translate([11, 12, 2]) color("brown") cube([1, 1, 1],center=true);
    translate([11, 13, 0]) color("brown") cube([1, 1, 1],center=true);
    translate([11, 13, 1]) color("brown") cube([1, 1, 1],center=true);
    translate([11, 13, 2]) color("brown") cube([1, 1, 1],center=true);
    translate([11, 14, 0]) color("brown") cube([1, 1, 1],center=true);
    translate([11, 14, 1]) color("brown") cube([1, 1, 1],center=true);
    translate([11, 14, 2]) color("brown") cube([1, 1, 1],center=true);
    translate([11, 15, 0]) color("brown") cube([1, 1, 1],center=true);
    translate([11, 15, 1]) color("brown") cube([1, 1, 1],center=true);
    translate([11, 15, 2]) color("brown") cube([1, 1, 1],center=true);
    translate([12, 0, 0]) color("brown") cube([1, 1, 1],center=true);
    translate([12, 0, 1]) color("brown") cube([1, 1, 1],center=true);
    translate([12, 0, 2]) color("brown") cube([1, 1, 1],center=true);
    translate([12, 1, 0]) color("brown") cube([1, 1, 1],center=true);
    translate([12, 1, 1]) color("brown") cube([1, 1, 1],center=true);
    translate([12, 1, 2]) color("brown") cube([1, 1, 1],center=true);
    translate([12, 2, 0]) color("brown") cube([1, 1, 1],center=true);
    translate([12, 2, 1]) color("brown") cube([1, 1, 1],center=true);
    translate([12, 2, 2]) color("brown") cube([1, 1, 1],center=true);
    translate([12, 3, 0]) color("brown") cube([1, 1, 1],center=true);
    translate([12, 3, 1]) color("brown") cube([1, 1, 1],center=true);
    translate([12, 3, 2]) color("brown") cube([1, 1, 1],center=true);
    translate([12, 4, 0]) color("brown") cube([1, 1, 1],center=true);
    translate([12, 4, 1]) color("brown") cube([1, 1, 1],center=true);
    translate([12, 4, 2]) color("brown") cube([1, 1, 1],center=true);
    translate([12, 5, 0]) color("brown") cube([1, 1, 1],center=true);
    translate([12, 5, 1]) color("brown") cube([1, 1, 1],center=true);
    translate([12, 5, 2]) color("brown") cube([1, 1, 1],center=true);
    translate([12, 6, 0]) color("brown") cube([1, 1, 1],center=true);
    translate([12, 6, 1]) color("brown") cube([1, 1, 1],center=true);
    translate([12, 6, 2]) color("brown") cube([1, 1, 1],center=true);
    translate([12, 7, 0]) color("brown") cube([1, 1, 1],center=true);
    translate([12, 7, 1]) color("brown") cube([1, 1, 1],center=true);
    translate([12, 7, 2]) color("brown") cube([1, 1, 1],center=true);
    translate([12, 8, 0]) color("brown") cube([1, 1, 1],center=true);
    translate([12, 8, 1]) color("brown") cube([1, 1, 1],center=true);
    translate([12, 8, 2]) color("brown") cube([1, 1, 1],center=true);
    translate([12, 9, 0]) color("brown") cube([1, 1, 1],center=true);
    translate([12, 9, 1]) color("brown") cube([1, 1, 1],center=true);
    translate([12, 9, 2]) color("brown") cube([1, 1, 1],center=true);
    translate([12, 10, 0]) color("brown") cube([1, 1, 1],center=true);
    translate([12, 10, 1]) color("brown") cube([1, 1, 1],center=true);
    translate([12, 10, 2]) color("brown") cube([1, 1, 1],center=true);
    translate([12, 11, 0]) color("brown") cube([1, 1, 1],center=true);
    translate([12, 11, 1]) color("brown") cube([1, 1, 1],center=true);
    translate([12, 11, 2]) color("brown") cube([1, 1, 1],center=true);
    translate([12, 12, 0]) color("brown") cube([1, 1, 1],center=true);
    translate([12, 12, 1]) color("brown") cube([1, 1, 1],center=true);
    translate([12, 12, 2]) color("brown") cube([1, 1, 1],center=true);
    translate([12, 13, 0]) color("brown") cube([1, 1, 1],center=true);
    translate([12, 13, 1]) color("brown") cube([1, 1, 1],center=true);
    translate([12, 13, 2]) color("brown") cube([1, 1, 1],center=true);
    translate([12, 14, 0]) color("brown") cube([1, 1, 1],center=true);
    translate([12, 14, 1]) color("brown") cube([1, 1, 1],center=true);
    translate([12, 14, 2]) color("brown") cube([1, 1, 1],center=true);
    translate([12, 15, 0]) color("brown") cube([1, 1, 1],center=true);
    translate([12, 15, 1]) color("brown") cube([1, 1, 1],center=true);
    translate([12, 15, 2]) color("brown") cube([1, 1, 1],center=true);
    translate([13, 0, 0]) color("brown") cube([1, 1, 1],center=true);
    translate([13, 0, 1]) color("brown") cube([1, 1, 1],center=true);
    translate([13, 0, 2]) color("brown") cube([1, 1, 1],center=true);
    translate([13, 1, 0]) color("brown") cube([1, 1, 1],center=true);
    translate([13, 1, 1]) color("brown") cube([1, 1, 1],center=true);
    translate([13, 1, 2]) color("brown") cube([1, 1, 1],center=true);
    translate([13, 2, 0]) color("brown") cube([1, 1, 1],center=true);
    translate([13, 2, 1]) color("brown") cube([1, 1, 1],center=true);
    translate([13, 2, 2]) color("brown") cube([1, 1, 1],center=true);
    translate([13, 3, 0]) color("brown") cube([1, 1, 1],center=true);
    translate([13, 3, 1]) color("brown") cube([1, 1, 1],center=true);
    translate([13, 3, 2]) color("brown") cube([1, 1, 1],center=true);
    translate([13, 4, 0]) color("brown") cube([1, 1, 1],center=true);
    translate([13, 4, 1]) color("brown") cube([1, 1, 1],center=true);
    translate([13, 4, 2]) color("brown") cube([1, 1, 1],center=true);
    translate([13, 5, 0]) color("brown") cube([1, 1, 1],center=true);
    translate([13, 5, 1]) color("brown") cube([1, 1, 1],center=true);
    translate([13, 5, 2]) color("brown") cube([1, 1, 1],center=true);
    translate([13, 6, 0]) color("brown") cube([1, 1, 1],center=true);
    translate([13, 6, 1]) color("brown") cube([1, 1, 1],center=true);
    translate([13, 6, 2]) color("brown") cube([1, 1, 1],center=true);
    translate([13, 7, 0]) color("brown") cube([1, 1, 1],center=true);
    translate([13, 7, 1]) color("brown") cube([1, 1, 1],center=true);
    translate([13, 7, 2]) color("brown") cube([1, 1, 1],center=true);
    translate([13, 8, 0]) color("brown") cube([1, 1, 1],center=true);
    translate([13, 8, 1]) color("brown") cube([1, 1, 1],center=true);
    translate([13, 8, 2]) color("brown") cube([1, 1, 1],center=true);
    translate([13, 9, 0]) color("brown") cube([1, 1, 1],center=true);
    translate([13, 9, 1]) color("brown") cube([1, 1, 1],center=true);
    translate([13, 9, 2]) color("brown") cube([1, 1, 1],center=true);
    translate([13, 10, 0]) color("brown") cube([1, 1, 1],center=true);
    translate([13, 10, 1]) color("brown") cube([1, 1, 1],center=true);
    translate([13, 10, 2]) color("brown") cube([1, 1, 1],center=true);
    translate([13, 11, 0]) color("brown") cube([1, 1, 1],center=true);
    translate([13, 11, 1]) color("brown") cube([1, 1, 1],center=true);
    translate([13, 11, 2]) color("brown") cube([1, 1, 1],center=true);
    translate([13, 12, 0]) color("brown") cube([1, 1, 1],center=true);
    translate([13, 12, 1]) color("brown") cube([1, 1, 1],center=true);
    translate([13, 12, 2]) color("brown") cube([1, 1, 1],center=true);
    translate([13, 13, 0]) color("brown") cube([1, 1, 1],center=true);
    translate([13, 13, 1]) color("brown") cube([1, 1, 1],center=true);
    translate([13, 13, 2]) color("brown") cube([1, 1, 1],center=true);
    translate([13, 14, 0]) color("brown") cube([1, 1, 1],center=true);
    translate([13, 14, 1]) color("brown") cube([1, 1, 1],center=true);
    translate([13, 14, 2]) color("brown") cube([1, 1, 1],center=true);
    translate([13, 15, 0]) color("brown") cube([1, 1, 1],center=true);
    translate([13, 15, 1]) color("brown") cube([1, 1, 1],center=true);
    translate([13, 15, 2]) color("brown") cube([1, 1, 1],center=true);
    translate([14, 0, 0]) color("brown") cube([1, 1, 1],center=true);
    translate([14, 0, 1]) color("brown") cube([1, 1, 1],center=true);
    translate([14, 0, 2]) color("brown") cube([1, 1, 1],center=true);
    translate([14, 1, 0]) color("brown") cube([1, 1, 1],center=true);
    translate([14, 1, 1]) color("brown") cube([1, 1, 1],center=true);
    translate([14, 1, 2]) color("brown") cube([1, 1, 1],center=true);
    translate([14, 2, 0]) color("brown") cube([1, 1, 1],center=true);
    translate([14, 2, 1]) color("brown") cube([1, 1, 1],center=true);
    translate([14, 2, 2]) color("brown") cube([1, 1, 1],center=true);
    translate([14, 3, 0]) color("brown") cube([1, 1, 1],center=true);
    translate([14, 3, 1]) color("brown") cube([1, 1, 1],center=true);
    translate([14, 3, 2]) color("brown") cube([1, 1, 1],center=true);
    translate([14, 4, 0]) color("brown") cube([1, 1, 1],center=true);
    translate([14, 4, 1]) color("brown") cube([1, 1, 1],center=true);
    translate([14, 4, 2]) color("brown") cube([1, 1, 1],center=true);
    translate([14, 5, 0]) color("brown") cube([1, 1, 1],center=true);
    translate([14, 5, 1]) color("brown") cube([1, 1, 1],center=true);
    translate([14, 5, 2]) color("brown") cube([1, 1, 1],center=true);
    translate([14, 6, 0]) color("brown") cube([1, 1, 1],center=true);
    translate([14, 6, 1]) color("brown") cube([1, 1, 1],center=true);
    translate([14, 6, 2]) color("brown") cube([1, 1, 1],center=true);
    translate([14, 7, 0]) color("brown") cube([1, 1, 1],center=true);
    translate([14, 7, 1]) color("brown") cube([1, 1, 1],center=true);
    translate([14, 7, 2]) color("brown") cube([1, 1, 1],center=true);
    translate([14, 8, 0]) color("brown") cube([1, 1, 1],center=true);
    translate([14, 8, 1]) color("brown") cube([1, 1, 1],center=true);
    translate([14, 8, 2]) color("brown") cube([1, 1, 1],center=true);
    translate([14, 9, 0]) color("brown") cube([1, 1, 1],center=true);
    translate([14, 9, 1]) color("brown") cube([1, 1, 1],center=true);
    translate([14, 9, 2]) color("brown") cube([1, 1, 1],center=true);
    translate([14, 10, 0]) color("brown") cube([1, 1, 1],center=true);
    translate([14, 10, 1]) color("brown") cube([1, 1, 1],center=true);
    translate([14, 10, 2]) color("brown") cube([1, 1, 1],center=true);
    translate([14, 11, 0]) color("brown") cube([1, 1, 1],center=true);
    translate([14, 11, 1]) color("brown") cube([1, 1, 1],center=true);
    translate([14, 11, 2]) color("brown") cube([1, 1, 1],center=true);
    translate([14, 12, 0]) color("brown") cube([1, 1, 1],center=true);
    translate([14, 12, 1]) color("brown") cube([1, 1, 1],center=true);
    translate([14, 12, 2]) color("brown") cube([1, 1, 1],center=true);
    translate([14, 13, 0]) color("brown") cube([1, 1, 1],center=true);
    translate([14, 13, 1]) color("brown") cube([1, 1, 1],center=true);
    translate([14, 13, 2]) color("brown") cube([1, 1, 1],center=true);
    translate([14, 14, 0]) color("brown") cube([1, 1, 1],center=true);
    translate([14, 14, 1]) color("brown") cube([1, 1, 1],center=true);
    translate([14, 14, 2]) color("brown") cube([1, 1, 1],center=true);
    translate([14, 15, 0]) color("brown") cube([1, 1, 1],center=true);
    translate([14, 15, 1]) color("brown") cube([1, 1, 1],center=true);
    translate([14, 15, 2]) color("brown") cube([1, 1, 1],center=true);
    translate([15, 0, 0]) color("brown") cube([1, 1, 1],center=true);
    translate([15, 0, 1]) color("brown") cube([1, 1, 1],center=true);
    translate([15, 0, 2]) color("brown") cube([1, 1, 1],center=true);
    translate([15, 1, 0]) color("brown") cube([1, 1, 1],center=true);
    translate([15, 1, 1]) color("brown") cube([1, 1, 1],center=true);
    translate([15, 1, 2]) color("brown") cube([1, 1, 1],center=true);
    translate([15, 2, 0]) color("brown") cube([1, 1, 1],center=true);
    translate([15, 2, 1]) color("brown") cube([1, 1, 1],center=true);
    translate([15, 2, 2]) color("brown") cube([1, 1, 1],center=true);
    translate([15, 3, 0]) color("brown") cube([1, 1, 1],center=true);
    translate([15, 3, 1]) color("brown") cube([1, 1, 1],center=true);
    translate([15, 3, 2]) color("brown") cube([1, 1, 1],center=true);
    translate([15, 4, 0]) color("brown") cube([1, 1, 1],center=true);
    translate([15, 4, 1]) color("brown") cube([1, 1, 1],center=true);
    translate([15, 4, 2]) color("brown") cube([1, 1, 1],center=true);
    translate([15, 5, 0]) color("brown") cube([1, 1, 1],center=true);
    translate([15, 5, 1]) color("brown") cube([1, 1, 1],center=true);
    translate([15, 5, 2]) color("brown") cube([1, 1, 1],center=true);
    translate([15, 6, 0]) color("brown") cube([1, 1, 1],center=true);
    translate([15, 6, 1]) color("brown") cube([1, 1, 1],center=true);
    translate([15, 6, 2]) color("brown") cube([1, 1, 1],center=true);
    translate([15, 7, 0]) color("brown") cube([1, 1, 1],center=true);
    translate([15, 7, 1]) color("brown") cube([1, 1, 1],center=true);
    translate([15, 7, 2]) color("brown") cube([1, 1, 1],center=true);
    translate([15, 8, 0]) color("brown") cube([1, 1, 1],center=true);
    translate([15, 8, 1]) color("brown") cube([1, 1, 1],center=true);
    translate([15, 8, 2]) color("brown") cube([1, 1, 1],center=true);
    translate([15, 9, 0]) color("brown") cube([1, 1, 1],center=true);
    translate([15, 9, 1]) color("brown") cube([1, 1, 1],center=true);
    translate([15, 9, 2]) color("brown") cube([1, 1, 1],center=true);
    translate([15, 10, 0]) color("brown") cube([1, 1, 1],center=true);
    translate([15, 10, 1]) color("brown") cube([1, 1, 1],center=true);
    translate([15, 10, 2]) color("brown") cube([1, 1, 1],center=true);
    translate([15, 11, 0]) color("brown") cube([1, 1, 1],center=true);
    translate([15, 11, 1]) color("brown") cube([1, 1, 1],center=true);
    translate([15, 11, 2]) color("brown") cube([1, 1, 1],center=true);
    translate([15, 12, 0]) color("brown") cube([1, 1, 1],center=true);
    translate([15, 12, 1]) color("brown") cube([1, 1, 1],center=true);
    translate([15, 12, 2]) color("brown") cube([1, 1, 1],center=true);
    translate([15, 13, 0]) color("brown") cube([1, 1, 1],center=true);
    translate([15, 13, 1]) color("brown") cube([1, 1, 1],center=true);
    translate([15, 13, 2]) color("brown") cube([1, 1, 1],center=true);
    translate([15, 14, 0]) color("brown") cube([1, 1, 1],center=true);
    translate([15, 14, 1]) color("brown") cube([1, 1, 1],center=true);
    translate([15, 14, 2]) color("brown") cube([1, 1, 1],center=true);
    translate([15, 15, 0]) color("brown") cube([1, 1, 1],center=true);
    translate([15, 15, 1]) color("brown") cube([1, 1, 1],center=true);
    translate([15, 15, 2]) color("brown") cube([1, 1, 1],center=true);
}
